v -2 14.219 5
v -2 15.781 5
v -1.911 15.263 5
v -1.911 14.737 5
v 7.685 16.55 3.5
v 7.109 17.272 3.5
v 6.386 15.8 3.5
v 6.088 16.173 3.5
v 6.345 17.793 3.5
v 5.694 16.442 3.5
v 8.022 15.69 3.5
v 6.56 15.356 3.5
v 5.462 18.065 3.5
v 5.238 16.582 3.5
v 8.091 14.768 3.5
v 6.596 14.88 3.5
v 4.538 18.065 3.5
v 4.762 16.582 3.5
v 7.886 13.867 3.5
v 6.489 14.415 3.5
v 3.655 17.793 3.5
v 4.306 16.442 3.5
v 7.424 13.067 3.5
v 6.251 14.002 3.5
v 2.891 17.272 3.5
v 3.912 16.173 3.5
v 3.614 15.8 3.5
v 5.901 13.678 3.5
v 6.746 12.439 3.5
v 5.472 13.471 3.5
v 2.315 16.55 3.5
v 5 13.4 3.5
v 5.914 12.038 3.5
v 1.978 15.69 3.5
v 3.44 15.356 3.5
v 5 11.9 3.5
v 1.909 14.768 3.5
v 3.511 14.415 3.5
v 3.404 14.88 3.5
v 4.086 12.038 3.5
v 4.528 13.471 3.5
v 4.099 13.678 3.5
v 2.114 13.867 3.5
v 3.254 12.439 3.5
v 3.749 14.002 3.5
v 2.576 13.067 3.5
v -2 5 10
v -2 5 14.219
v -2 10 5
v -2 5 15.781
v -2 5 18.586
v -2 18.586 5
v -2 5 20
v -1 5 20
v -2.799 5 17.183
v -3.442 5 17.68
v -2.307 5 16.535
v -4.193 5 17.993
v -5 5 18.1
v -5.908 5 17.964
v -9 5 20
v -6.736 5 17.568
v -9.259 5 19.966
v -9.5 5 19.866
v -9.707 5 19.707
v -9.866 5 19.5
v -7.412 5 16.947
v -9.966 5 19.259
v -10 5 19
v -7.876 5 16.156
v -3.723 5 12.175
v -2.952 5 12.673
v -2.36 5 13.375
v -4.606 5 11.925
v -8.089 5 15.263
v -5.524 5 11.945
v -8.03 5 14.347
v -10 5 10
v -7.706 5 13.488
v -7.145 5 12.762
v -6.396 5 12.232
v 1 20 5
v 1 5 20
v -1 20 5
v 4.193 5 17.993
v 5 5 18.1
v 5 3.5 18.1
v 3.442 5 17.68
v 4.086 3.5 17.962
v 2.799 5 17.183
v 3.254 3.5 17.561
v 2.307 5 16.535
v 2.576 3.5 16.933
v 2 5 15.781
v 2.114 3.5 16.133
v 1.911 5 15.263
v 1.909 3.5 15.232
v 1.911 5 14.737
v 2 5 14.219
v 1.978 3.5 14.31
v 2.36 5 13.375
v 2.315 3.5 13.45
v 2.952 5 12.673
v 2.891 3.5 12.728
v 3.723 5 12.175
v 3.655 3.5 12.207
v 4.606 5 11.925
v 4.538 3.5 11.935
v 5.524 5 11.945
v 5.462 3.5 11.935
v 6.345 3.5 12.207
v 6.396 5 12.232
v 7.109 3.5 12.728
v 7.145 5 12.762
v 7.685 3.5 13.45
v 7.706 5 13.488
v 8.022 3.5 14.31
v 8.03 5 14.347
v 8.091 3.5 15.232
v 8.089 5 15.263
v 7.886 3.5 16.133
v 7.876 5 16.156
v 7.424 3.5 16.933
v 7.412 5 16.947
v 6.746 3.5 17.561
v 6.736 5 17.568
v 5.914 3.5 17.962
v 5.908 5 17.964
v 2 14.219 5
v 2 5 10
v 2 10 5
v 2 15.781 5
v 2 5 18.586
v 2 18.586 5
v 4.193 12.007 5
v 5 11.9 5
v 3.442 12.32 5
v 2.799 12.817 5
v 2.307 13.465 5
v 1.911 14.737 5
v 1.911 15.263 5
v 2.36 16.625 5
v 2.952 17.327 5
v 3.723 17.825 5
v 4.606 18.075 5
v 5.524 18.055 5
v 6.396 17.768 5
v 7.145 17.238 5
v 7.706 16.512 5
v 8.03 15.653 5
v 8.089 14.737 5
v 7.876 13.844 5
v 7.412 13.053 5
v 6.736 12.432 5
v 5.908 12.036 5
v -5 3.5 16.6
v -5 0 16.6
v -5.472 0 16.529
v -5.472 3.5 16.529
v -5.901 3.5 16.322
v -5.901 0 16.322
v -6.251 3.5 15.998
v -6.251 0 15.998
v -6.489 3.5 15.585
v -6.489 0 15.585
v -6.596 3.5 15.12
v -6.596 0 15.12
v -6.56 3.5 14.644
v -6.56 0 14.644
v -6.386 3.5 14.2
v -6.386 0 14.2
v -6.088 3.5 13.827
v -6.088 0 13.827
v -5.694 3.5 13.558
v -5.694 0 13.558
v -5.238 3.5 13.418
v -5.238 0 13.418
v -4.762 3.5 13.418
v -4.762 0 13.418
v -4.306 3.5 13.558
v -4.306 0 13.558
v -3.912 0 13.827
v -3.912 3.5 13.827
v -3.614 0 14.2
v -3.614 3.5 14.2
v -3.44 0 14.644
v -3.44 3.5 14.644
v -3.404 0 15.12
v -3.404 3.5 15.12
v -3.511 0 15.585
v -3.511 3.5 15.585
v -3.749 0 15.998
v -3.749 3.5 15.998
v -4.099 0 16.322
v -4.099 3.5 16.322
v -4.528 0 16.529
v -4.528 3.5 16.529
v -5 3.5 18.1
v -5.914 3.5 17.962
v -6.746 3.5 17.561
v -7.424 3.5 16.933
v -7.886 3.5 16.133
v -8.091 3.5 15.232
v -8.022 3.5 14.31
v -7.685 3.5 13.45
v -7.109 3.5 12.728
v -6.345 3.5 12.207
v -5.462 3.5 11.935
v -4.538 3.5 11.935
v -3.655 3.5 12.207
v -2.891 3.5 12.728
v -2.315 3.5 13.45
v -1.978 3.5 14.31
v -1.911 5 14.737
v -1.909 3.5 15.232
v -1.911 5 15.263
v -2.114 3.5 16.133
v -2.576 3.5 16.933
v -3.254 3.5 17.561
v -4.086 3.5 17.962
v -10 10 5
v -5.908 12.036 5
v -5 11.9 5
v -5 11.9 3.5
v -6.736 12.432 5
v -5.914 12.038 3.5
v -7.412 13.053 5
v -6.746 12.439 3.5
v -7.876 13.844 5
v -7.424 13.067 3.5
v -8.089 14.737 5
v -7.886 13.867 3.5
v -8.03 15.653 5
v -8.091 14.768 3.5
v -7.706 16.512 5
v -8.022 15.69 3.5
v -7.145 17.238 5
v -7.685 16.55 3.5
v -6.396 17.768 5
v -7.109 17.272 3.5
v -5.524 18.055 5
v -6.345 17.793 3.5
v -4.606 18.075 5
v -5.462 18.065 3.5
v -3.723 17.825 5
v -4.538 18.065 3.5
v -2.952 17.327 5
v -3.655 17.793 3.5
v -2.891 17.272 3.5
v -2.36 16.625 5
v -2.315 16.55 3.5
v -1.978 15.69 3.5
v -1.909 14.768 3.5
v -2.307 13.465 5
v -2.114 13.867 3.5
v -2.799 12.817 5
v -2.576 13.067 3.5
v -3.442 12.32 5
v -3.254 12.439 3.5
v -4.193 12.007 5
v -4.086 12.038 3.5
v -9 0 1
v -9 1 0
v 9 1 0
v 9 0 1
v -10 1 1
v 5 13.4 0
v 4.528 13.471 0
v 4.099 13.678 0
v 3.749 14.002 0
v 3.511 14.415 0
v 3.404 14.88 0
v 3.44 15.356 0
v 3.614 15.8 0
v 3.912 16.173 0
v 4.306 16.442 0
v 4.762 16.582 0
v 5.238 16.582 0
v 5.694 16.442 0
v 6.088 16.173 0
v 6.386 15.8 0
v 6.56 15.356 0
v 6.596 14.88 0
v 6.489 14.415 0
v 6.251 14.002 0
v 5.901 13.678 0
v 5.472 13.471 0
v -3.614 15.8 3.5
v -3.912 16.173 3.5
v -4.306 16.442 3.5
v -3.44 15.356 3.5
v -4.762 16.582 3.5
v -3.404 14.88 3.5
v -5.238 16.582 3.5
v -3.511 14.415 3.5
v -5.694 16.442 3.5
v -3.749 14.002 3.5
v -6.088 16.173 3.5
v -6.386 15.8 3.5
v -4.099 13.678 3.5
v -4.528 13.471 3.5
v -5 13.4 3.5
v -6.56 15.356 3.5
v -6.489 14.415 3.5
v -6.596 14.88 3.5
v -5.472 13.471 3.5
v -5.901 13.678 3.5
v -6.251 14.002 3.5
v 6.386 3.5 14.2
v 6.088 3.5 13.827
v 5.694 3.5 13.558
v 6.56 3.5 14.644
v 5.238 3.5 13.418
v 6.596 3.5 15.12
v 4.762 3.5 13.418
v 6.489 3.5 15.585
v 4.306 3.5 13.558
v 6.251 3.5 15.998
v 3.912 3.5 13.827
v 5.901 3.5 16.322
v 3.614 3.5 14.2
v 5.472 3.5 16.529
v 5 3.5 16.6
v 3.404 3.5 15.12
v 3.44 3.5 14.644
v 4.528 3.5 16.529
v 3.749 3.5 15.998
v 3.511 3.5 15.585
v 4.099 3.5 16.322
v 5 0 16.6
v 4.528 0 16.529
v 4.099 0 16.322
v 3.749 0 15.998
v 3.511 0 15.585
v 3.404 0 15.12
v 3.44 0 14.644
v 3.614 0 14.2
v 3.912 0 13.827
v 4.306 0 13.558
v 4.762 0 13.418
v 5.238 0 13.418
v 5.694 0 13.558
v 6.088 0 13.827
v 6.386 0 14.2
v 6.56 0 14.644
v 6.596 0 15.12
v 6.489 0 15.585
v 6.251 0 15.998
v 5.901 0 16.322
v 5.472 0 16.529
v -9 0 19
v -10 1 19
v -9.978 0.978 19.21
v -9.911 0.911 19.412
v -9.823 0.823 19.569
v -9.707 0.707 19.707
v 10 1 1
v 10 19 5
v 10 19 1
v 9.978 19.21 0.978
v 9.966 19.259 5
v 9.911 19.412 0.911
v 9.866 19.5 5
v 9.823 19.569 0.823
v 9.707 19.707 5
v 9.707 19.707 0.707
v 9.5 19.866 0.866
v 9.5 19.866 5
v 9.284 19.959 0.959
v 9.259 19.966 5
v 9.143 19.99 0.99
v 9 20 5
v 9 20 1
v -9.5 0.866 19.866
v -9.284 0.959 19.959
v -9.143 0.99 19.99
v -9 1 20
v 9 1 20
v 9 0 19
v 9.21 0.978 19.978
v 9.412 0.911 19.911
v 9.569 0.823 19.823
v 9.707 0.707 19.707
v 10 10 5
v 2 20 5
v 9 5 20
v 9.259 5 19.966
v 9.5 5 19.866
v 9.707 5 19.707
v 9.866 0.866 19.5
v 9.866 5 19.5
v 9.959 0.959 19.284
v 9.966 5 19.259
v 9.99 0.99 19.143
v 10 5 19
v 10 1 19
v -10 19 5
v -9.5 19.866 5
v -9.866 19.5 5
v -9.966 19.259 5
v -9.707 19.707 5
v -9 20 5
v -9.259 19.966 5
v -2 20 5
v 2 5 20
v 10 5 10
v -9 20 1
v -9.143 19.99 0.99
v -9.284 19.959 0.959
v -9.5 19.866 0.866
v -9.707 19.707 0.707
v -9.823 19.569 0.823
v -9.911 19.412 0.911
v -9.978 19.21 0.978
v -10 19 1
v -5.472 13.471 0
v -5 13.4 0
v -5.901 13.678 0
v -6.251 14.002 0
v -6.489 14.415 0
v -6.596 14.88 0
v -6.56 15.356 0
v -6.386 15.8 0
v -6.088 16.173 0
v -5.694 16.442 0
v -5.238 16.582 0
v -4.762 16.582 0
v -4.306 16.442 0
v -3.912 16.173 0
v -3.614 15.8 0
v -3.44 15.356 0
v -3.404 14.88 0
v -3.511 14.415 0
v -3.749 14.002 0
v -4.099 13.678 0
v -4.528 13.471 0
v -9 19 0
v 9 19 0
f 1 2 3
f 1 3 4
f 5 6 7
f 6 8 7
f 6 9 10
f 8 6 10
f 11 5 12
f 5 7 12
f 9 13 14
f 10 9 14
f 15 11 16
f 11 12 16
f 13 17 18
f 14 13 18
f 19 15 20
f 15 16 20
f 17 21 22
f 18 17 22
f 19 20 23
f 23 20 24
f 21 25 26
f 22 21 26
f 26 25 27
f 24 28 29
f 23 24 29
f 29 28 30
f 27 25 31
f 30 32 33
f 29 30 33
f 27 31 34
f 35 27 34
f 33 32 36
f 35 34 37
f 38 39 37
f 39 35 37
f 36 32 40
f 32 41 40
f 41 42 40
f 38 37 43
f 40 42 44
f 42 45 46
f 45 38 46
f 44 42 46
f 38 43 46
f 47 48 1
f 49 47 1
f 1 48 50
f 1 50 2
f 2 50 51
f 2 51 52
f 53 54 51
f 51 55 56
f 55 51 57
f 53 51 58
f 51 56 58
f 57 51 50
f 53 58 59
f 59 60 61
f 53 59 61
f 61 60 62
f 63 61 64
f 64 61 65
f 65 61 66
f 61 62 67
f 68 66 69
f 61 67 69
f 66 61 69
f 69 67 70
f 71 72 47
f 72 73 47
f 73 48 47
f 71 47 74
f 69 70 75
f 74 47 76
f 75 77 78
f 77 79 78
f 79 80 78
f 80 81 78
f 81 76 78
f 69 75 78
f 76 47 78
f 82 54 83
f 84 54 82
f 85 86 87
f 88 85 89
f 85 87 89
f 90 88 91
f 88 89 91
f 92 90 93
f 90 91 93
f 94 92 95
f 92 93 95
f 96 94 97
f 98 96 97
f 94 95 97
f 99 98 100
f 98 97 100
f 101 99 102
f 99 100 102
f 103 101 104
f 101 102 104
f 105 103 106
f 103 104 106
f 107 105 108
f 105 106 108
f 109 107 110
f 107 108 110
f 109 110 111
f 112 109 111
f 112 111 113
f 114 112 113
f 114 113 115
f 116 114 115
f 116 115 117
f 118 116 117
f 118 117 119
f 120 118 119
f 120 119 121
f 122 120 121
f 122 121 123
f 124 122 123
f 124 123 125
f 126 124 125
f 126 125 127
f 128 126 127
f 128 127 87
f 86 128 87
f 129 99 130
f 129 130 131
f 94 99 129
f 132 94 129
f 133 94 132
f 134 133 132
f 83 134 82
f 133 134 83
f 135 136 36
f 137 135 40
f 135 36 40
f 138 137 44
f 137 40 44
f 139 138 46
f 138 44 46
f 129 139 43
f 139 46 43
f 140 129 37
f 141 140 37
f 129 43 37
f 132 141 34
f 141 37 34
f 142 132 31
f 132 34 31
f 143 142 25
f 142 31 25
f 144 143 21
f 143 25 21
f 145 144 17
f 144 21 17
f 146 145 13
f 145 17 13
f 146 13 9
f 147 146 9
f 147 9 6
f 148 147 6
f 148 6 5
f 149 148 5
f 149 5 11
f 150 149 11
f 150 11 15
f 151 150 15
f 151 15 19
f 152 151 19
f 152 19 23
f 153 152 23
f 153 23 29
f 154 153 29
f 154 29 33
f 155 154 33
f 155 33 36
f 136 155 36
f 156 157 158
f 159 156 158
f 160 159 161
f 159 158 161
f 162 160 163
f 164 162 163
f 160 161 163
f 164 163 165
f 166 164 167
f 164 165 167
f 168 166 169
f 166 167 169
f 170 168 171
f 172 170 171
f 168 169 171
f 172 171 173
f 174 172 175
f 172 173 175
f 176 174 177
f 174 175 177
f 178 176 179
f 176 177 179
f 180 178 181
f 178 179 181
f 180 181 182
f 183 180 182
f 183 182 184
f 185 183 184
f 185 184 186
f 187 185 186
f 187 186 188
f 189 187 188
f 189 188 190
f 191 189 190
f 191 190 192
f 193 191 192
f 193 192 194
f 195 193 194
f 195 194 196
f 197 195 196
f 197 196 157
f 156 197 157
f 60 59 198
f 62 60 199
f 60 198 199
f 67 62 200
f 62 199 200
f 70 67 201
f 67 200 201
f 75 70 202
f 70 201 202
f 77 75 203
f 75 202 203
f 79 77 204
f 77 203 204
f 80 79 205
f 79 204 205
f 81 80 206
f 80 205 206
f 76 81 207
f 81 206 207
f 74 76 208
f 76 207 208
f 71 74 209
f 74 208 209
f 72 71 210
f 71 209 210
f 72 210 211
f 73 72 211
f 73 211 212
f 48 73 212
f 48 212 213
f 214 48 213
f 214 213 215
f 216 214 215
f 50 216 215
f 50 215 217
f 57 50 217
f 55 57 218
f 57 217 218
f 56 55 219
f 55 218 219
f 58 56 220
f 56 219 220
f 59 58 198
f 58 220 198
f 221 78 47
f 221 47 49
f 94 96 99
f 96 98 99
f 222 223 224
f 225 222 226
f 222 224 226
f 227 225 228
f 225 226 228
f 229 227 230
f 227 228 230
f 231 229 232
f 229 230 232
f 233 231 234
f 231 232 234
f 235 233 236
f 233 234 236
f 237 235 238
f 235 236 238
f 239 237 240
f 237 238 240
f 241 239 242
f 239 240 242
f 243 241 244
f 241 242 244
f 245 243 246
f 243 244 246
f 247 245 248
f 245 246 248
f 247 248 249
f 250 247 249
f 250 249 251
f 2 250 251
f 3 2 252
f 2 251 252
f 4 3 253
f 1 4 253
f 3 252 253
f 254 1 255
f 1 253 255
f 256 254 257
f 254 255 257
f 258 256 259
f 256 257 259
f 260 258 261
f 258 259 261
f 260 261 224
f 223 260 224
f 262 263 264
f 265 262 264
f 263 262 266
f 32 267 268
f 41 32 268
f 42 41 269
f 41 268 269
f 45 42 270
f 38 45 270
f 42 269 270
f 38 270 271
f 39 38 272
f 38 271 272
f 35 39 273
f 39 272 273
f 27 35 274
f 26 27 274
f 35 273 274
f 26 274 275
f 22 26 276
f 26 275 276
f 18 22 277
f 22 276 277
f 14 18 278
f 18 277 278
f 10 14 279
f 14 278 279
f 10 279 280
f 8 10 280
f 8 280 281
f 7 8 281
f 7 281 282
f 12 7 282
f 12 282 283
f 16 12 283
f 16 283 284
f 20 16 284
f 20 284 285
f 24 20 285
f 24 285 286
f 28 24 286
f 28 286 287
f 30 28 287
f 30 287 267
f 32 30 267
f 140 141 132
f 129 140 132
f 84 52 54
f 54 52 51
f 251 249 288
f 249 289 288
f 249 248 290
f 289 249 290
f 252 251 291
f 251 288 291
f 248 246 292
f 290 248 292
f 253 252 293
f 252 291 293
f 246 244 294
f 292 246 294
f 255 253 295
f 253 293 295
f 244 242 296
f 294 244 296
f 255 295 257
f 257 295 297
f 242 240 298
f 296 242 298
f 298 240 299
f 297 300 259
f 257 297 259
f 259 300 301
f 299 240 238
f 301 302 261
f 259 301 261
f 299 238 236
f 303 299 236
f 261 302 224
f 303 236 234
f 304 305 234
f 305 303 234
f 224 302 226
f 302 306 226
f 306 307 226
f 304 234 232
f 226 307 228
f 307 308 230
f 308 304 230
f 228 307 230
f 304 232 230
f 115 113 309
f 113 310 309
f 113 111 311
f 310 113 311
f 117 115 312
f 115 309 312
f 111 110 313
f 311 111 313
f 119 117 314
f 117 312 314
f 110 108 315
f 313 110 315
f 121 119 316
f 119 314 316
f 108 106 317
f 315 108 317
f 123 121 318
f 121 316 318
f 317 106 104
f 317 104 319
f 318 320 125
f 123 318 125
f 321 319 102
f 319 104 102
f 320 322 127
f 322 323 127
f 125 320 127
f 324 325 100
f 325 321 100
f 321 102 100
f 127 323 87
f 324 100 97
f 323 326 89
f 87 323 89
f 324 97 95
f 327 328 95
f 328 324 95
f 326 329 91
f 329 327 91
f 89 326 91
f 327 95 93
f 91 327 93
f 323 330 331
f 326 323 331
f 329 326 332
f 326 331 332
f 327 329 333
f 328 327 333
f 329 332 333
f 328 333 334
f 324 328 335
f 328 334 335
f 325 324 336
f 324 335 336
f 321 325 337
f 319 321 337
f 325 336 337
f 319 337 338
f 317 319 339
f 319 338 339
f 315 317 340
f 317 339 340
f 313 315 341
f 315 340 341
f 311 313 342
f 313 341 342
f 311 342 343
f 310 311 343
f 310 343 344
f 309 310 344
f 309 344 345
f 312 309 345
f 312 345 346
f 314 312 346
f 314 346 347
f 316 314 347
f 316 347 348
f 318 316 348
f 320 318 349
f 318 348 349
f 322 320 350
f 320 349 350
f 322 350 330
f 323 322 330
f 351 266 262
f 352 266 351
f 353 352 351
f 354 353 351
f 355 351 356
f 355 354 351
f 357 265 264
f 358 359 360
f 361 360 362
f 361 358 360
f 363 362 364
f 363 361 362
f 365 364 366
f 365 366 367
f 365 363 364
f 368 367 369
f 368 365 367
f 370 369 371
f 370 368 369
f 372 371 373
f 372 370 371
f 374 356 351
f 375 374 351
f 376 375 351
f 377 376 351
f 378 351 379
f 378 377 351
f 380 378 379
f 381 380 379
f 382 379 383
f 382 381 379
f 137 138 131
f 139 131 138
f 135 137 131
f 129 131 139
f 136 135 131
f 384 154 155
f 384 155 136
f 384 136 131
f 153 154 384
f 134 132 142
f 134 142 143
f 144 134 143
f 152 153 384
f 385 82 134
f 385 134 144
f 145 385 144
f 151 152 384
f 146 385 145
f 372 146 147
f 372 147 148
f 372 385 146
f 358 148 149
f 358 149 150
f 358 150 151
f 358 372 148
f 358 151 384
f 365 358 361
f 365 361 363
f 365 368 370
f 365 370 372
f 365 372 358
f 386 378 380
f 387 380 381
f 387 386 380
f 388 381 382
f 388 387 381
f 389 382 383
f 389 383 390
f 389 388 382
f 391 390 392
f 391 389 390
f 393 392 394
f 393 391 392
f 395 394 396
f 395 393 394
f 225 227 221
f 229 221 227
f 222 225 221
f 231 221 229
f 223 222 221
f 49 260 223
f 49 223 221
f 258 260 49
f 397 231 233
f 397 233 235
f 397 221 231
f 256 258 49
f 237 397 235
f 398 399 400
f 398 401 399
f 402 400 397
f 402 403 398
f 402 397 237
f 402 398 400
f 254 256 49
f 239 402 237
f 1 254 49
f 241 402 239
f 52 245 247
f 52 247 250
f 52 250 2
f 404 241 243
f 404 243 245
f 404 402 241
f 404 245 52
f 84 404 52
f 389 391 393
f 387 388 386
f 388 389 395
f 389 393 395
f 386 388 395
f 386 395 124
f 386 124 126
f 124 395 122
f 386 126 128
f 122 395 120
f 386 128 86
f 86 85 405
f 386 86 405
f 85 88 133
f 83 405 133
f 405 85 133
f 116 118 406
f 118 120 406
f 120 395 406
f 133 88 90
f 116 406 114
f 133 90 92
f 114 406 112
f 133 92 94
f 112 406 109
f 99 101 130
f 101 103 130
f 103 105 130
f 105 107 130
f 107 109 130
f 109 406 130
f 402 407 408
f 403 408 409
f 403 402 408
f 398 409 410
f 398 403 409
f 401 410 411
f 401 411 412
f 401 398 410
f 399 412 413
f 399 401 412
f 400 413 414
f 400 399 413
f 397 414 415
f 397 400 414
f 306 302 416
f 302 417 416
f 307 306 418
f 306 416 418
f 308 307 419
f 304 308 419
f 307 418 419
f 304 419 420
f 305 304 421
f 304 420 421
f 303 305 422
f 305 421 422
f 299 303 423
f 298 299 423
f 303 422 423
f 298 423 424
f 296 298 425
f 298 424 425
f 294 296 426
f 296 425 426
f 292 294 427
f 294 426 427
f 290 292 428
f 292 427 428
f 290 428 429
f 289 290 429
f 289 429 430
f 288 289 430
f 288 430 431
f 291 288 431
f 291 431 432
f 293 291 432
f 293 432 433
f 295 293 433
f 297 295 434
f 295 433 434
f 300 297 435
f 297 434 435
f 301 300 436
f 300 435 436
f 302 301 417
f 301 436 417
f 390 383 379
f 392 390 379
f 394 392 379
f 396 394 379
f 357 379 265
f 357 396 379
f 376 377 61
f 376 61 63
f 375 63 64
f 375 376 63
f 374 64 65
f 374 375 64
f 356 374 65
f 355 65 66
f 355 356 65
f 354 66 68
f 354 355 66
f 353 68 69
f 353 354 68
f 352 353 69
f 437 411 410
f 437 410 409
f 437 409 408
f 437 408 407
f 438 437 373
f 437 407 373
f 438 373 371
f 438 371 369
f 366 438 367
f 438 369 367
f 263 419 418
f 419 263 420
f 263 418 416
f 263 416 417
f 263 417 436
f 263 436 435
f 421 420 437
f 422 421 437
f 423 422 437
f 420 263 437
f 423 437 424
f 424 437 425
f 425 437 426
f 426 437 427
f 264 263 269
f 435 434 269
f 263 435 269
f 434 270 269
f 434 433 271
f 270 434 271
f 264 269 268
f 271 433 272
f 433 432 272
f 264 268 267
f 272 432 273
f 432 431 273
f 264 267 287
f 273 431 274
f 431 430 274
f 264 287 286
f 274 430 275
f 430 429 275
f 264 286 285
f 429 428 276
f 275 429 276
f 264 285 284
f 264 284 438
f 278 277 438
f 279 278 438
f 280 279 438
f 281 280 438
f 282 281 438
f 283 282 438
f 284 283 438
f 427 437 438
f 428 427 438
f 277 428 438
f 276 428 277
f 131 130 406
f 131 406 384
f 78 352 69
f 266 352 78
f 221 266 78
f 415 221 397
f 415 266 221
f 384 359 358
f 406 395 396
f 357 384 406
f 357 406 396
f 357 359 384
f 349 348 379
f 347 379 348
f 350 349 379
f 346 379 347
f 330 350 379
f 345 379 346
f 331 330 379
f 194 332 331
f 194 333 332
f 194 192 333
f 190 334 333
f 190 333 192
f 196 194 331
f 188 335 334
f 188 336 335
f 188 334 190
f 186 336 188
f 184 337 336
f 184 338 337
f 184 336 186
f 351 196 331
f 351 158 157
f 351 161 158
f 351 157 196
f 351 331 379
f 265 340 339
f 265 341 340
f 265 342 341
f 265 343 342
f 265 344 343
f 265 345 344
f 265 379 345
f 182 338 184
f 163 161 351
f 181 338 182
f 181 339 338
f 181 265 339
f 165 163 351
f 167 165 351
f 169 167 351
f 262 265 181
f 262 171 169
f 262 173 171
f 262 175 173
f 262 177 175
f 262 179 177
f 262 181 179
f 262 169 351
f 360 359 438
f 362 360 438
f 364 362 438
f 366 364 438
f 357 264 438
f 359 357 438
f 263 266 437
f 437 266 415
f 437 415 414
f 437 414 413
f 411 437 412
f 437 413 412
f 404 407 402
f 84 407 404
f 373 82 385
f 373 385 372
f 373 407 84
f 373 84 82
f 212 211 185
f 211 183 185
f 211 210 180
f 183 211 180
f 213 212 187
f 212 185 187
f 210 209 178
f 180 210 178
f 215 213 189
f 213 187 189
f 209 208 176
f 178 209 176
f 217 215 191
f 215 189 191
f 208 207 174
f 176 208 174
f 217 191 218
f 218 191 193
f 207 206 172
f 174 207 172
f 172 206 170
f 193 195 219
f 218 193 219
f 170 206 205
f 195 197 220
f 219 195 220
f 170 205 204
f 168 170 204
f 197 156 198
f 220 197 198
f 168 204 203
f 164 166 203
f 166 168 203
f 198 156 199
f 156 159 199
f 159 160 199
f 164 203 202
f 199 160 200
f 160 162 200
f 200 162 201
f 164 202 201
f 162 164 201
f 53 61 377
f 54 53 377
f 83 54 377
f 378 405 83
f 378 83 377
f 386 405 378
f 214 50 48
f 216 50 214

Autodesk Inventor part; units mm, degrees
ref_plane "YZ Plane" through (0, 0, 0) normal (1, 0, 0) x (0, 1, 0)
ref_plane "XZ Plane" through (0, 0, 0) normal (0, 1, 0) x (-1, 0, 0)
ref_plane "XY Plane" through (0, 0, 0) normal (0, 0, 1) x (1, 0, 0)
sketch "Boceto1" plane through (0, 0, 0) normal (0, 0, 1) x (1, 0, 0)
  line L0 (10, 0) -> (-10, 0)
  line L1 (-10, 0) -> (-10, 20)
  line L2 (-10, 20) -> (10, 20)
  line L3 (10, 20) -> (10, 0)
  point P0 (0, 0)
  point P1 (0, 0)
  dimension "d0" = 20
  dimension "d1" = 20
extrude "Extrusión1" add sketch "Boceto1" along normal blind 5
sketch "Boceto2" plane through (0, 0, 0) normal (0, 0, 1) x (1, 0, 0)
  line L0 (-10, 0) -> (10, 0) construction
  line L1 (-10, 0) -> (10, 0)
  line L2 (10, 0) -> (10, 5)
  line L3 (10, 5) -> (-10, 5)
  line L4 (-10, 5) -> (-10, 0)
  point P0 (0, 0)
  dimension "d4" = 5
extrude "Extrusión2" add sketch "Boceto2" along normal blind 20
sketch "Boceto3" plane through (0, 0, 5) normal (0, 0, 1) x (1, 0, 0)
  line L0 (-10, 20) -> (-10, 5) construction
  line L1 (10, 20) -> (-10, 20) construction
  line L2 (10, 5) -> (10, 20) construction
  point P0 (0, 0)
  point P1 (-5, 15)
  point P2 (5, 15)
  dimension "d7" = 5
  dimension "d8" = 5
  dimension "d9" = 5
  dimension "d10" = 5
sketch "Boceto4" plane through (-10, 5, 5) normal (0, 1, 0) x (1, 0, 0)
  line L0 (0, 0) -> (0, -15) construction
  line L1 (20, -15) -> (0, -15) construction
  line L2 (20, 0) -> (20, -15) construction
  point P0 (10, 5)
  point P1 (5, -10)
  point P2 (15, -10)
  dimension "d14" = 5
  dimension "d15" = 5
  dimension "d16" = 5
  dimension "d17" = 5
hole "Agujero1" at (-5, 5, 15) at (5, 5, 15) direction (0, -1, 0) diameter 3.2 end through all counterbore diameter 6.2 counterbore depth 1.5
hole "Agujero2" at (-5, 15, 5) at (5, 15, 5) direction (0, 0, -1) diameter 3.2 end through all counterbore diameter 6.2 counterbore depth 1.5
sketch "Boceto5" plane through (0, 0, 0) normal (1, 0, 0) x (0, 1, 0)
  line L0 (5, 5) -> (5, 20) construction
  line L1 (5, 20) -> (20, 5)
  line L2 (20, 5) -> (5, 5) construction
  line L3 (5, 5) -> (20, 5) construction
  line L4 (5, 20) -> (5, 5)
  line L5 (20, 5) -> (5, 5)
  point P0 (0, 0)
  dimension "d32" = 45
  dimension "d33" = 15
extrude "Extrusión4" add sketch "Boceto5" along normal mid plane 4
sketch "Boceto6" plane through (0, 0, 0) normal (1, 0, 0) x (0, 1, 0)
  line L0 (5, 5) -> (5, 20) construction
  line L1 (5, 10) -> (10, 5)
  line L2 (5, 5) -> (20, 5) construction
  line L3 (5, 5) -> (10, 5)
  line L4 (5, 10) -> (5, 5)
  point P0 (0, 0)
  dimension "d36" = 45
  dimension "d37" = 5
extrude "Extrusión5" add sketch "Boceto6" along normal mid plane 20
chamfer "Chaflán1" distance 1 angle 45 9 edges at (-10, 0, 10) (0, 0, 20) (10, 0, 10) (0, 0, 0) (-10, 10, 0) (10, 10, 0) (0, 20, 0) (-2, 12.5, 12.5) (2, 12.5, 12.5)
fillet "Empalme1" radius 1 4 edges at (-10, 3, 20) (-10, 20, 3) (10, 20, 3) (10, 3, 20)
properties part number "T"
